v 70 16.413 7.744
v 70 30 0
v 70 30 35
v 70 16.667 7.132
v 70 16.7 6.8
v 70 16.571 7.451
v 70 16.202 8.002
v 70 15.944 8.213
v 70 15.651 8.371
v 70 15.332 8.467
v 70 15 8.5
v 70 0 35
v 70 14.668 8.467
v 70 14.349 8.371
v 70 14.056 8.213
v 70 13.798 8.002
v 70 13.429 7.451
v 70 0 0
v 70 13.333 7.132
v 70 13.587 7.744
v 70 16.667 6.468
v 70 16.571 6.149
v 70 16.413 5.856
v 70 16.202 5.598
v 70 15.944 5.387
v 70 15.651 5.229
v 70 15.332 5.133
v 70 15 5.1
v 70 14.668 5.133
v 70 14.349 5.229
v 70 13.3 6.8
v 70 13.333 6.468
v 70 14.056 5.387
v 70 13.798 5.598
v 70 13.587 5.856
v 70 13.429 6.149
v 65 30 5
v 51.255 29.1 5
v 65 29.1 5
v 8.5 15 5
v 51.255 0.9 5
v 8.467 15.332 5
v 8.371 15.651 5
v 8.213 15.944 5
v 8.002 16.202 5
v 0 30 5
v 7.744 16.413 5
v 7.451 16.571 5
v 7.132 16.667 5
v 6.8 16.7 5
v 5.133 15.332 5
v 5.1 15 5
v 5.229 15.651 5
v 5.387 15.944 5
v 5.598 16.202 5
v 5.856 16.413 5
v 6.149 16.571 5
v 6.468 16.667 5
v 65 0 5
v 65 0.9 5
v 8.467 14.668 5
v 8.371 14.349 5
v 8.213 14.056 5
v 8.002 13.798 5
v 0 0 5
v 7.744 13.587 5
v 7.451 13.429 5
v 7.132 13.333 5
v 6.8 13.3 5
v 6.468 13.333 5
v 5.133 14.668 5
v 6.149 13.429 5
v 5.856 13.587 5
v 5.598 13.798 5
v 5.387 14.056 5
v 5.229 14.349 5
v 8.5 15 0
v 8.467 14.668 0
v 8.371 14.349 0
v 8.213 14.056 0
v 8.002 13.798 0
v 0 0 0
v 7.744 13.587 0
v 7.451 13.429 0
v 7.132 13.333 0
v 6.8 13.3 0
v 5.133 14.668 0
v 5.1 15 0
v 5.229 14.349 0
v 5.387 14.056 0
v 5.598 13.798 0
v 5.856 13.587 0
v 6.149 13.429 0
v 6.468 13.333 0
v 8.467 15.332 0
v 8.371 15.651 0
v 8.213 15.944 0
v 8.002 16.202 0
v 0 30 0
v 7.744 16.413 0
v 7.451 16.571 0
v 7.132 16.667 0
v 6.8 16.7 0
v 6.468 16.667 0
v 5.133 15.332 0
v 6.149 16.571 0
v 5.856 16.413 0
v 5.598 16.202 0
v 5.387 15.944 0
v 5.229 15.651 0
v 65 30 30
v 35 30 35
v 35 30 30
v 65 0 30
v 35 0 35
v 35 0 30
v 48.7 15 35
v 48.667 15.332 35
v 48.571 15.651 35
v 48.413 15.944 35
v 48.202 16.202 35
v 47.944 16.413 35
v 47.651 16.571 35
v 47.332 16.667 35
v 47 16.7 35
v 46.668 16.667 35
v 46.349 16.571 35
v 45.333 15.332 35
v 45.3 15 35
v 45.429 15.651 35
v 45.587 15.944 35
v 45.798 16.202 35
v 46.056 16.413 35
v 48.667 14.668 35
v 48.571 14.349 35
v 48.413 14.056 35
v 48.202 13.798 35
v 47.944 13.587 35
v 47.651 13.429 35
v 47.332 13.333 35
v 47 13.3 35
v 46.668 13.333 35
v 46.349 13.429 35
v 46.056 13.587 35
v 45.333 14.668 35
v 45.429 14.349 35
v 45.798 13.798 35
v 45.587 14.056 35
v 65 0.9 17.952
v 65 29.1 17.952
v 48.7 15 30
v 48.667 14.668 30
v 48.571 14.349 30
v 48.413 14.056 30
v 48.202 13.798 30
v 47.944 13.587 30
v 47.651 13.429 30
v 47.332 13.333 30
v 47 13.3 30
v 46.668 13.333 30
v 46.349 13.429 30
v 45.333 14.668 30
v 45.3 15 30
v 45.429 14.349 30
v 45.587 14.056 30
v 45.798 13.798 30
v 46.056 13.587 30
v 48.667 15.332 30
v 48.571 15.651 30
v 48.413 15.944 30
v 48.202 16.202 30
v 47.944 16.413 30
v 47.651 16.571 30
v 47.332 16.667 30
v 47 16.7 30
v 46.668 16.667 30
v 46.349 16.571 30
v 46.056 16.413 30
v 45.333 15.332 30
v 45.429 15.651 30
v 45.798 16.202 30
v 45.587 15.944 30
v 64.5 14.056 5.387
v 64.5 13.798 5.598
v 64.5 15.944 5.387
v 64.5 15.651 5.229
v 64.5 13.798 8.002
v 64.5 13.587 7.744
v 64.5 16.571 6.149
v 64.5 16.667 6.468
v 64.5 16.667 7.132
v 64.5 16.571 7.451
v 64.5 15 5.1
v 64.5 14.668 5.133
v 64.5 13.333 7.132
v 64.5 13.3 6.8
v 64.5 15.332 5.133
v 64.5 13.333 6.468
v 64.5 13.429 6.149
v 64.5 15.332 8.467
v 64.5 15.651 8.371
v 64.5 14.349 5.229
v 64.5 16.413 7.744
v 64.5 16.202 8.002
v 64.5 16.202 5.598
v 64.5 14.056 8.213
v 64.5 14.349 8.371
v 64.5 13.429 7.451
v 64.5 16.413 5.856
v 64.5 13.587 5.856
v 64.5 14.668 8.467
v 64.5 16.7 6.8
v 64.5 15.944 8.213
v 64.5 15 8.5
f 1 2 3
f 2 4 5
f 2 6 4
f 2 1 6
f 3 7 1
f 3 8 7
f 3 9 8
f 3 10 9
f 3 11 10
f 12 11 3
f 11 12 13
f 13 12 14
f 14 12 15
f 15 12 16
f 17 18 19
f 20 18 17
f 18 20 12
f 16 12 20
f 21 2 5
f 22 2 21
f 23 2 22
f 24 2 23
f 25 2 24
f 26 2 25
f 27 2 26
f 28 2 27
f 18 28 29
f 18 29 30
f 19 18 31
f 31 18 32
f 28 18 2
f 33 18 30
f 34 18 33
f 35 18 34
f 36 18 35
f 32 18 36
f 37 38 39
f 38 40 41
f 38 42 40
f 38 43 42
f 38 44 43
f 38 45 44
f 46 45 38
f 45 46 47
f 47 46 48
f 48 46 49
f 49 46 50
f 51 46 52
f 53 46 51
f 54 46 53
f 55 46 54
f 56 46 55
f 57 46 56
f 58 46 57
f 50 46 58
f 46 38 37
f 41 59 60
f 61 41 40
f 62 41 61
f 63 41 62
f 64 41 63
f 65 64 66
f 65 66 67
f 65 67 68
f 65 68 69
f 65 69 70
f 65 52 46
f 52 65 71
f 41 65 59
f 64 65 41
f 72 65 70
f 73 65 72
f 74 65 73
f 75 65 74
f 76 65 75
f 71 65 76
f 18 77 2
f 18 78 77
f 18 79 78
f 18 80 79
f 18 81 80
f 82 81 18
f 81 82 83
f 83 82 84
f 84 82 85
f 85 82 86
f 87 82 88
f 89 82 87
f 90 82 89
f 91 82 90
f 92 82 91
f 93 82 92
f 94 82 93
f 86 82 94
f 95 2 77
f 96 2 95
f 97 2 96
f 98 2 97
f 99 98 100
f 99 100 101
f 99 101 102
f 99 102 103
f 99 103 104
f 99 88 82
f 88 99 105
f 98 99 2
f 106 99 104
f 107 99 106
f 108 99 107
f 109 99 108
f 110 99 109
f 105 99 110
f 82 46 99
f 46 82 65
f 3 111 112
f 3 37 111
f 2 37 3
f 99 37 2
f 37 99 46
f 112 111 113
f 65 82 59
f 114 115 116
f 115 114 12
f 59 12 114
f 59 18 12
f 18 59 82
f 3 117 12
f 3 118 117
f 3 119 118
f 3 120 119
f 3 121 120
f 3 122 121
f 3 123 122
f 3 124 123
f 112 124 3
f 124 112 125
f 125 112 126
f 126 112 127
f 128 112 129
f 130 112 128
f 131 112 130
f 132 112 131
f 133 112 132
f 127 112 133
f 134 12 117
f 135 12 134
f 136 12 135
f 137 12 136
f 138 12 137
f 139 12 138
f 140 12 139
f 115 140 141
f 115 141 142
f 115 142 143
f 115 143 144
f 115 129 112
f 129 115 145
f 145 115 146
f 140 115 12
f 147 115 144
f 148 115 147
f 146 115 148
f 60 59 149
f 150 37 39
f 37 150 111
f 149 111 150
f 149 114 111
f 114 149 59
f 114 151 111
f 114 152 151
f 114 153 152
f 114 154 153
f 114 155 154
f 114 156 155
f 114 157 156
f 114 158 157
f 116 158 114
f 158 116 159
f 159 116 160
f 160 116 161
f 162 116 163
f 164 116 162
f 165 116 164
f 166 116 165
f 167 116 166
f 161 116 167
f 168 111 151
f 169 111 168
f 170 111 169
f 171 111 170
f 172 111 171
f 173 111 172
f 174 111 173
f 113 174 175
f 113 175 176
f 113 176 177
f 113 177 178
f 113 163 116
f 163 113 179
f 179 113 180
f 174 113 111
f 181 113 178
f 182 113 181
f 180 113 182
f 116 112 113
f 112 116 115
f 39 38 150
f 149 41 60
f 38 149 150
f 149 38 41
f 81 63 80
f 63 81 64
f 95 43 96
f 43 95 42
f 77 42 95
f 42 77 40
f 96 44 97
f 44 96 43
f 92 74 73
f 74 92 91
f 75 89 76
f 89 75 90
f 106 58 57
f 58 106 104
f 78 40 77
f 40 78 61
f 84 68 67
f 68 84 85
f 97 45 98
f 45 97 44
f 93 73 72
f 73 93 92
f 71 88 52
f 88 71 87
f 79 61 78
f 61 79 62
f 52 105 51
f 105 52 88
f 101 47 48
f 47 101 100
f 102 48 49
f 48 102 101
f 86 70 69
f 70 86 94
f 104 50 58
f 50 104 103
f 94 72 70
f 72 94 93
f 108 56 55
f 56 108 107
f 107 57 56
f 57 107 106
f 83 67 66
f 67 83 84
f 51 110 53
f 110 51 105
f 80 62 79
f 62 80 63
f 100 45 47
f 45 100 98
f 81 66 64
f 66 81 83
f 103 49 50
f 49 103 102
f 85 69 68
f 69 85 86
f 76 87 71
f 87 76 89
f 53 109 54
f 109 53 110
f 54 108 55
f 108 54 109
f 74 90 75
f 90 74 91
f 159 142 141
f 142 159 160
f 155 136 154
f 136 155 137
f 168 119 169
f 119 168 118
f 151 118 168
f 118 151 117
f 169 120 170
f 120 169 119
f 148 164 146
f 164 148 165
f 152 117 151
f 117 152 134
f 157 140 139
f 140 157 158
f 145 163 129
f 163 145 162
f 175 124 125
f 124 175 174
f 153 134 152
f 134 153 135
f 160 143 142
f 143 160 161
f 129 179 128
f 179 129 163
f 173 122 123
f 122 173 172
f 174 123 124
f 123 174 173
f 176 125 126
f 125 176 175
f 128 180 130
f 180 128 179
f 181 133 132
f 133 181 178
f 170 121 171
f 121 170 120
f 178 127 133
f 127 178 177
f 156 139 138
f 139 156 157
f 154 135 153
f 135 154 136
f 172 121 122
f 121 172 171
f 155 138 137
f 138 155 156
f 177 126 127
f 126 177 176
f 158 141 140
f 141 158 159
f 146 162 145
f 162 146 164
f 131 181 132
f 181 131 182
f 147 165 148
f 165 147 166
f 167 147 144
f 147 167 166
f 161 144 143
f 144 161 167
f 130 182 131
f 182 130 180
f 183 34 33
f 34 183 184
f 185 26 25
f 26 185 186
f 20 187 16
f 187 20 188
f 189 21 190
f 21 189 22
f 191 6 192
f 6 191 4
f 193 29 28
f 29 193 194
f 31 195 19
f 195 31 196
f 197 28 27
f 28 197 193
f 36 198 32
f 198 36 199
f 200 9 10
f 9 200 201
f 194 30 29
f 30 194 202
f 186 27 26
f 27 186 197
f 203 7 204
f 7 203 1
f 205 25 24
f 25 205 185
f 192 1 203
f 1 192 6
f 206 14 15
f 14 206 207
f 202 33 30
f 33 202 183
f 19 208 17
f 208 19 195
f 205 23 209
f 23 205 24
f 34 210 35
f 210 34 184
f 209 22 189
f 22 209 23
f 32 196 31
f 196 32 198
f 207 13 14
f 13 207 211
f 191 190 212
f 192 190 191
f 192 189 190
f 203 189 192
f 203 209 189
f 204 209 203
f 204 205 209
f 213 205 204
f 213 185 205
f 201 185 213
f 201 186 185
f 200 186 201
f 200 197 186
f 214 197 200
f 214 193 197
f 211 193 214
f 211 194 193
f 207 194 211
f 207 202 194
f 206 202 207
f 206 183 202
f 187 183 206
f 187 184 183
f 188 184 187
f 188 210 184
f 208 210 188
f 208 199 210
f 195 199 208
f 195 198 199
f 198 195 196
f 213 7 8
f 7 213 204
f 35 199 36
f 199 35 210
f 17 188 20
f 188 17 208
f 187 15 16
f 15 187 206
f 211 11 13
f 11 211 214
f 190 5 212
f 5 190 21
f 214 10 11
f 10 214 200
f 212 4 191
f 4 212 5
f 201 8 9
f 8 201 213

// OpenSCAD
$fn = 32;

// ----------------------------------------------------------------------
// Z-bracket: 70 x 30 x 35 mm
// ----------------------------------------------------------------------

// --- parameters (mm) ---
bottom_run = 70;          // lower foot length, X
top_run = 30;             // upper foot length, X
profile_w = 30;           // bracket width, Y
height = 35;              // overall rise, Z
mat_t = 5;                // plate thickness
hole_d = 3.4;             // clearance for M3
rib_len = 14.7;           // gusset leg
rib_sink = 0.9;           // gusset overlap into the plates

module hole_z(px, py, z0) {
  translate([px, py, z0 - 0.5]) cylinder(h = mat_t + 1, d = hole_d);
}
module hole_x(py, pz) {
  translate([-0.5, py, pz]) rotate([0, 90, 0]) cylinder(h = mat_t + 1, d = hole_d);
}
module gusset(x0) {
  translate([x0, profile_w - rib_sink, 0])
    rotate([90, 0, 0])
      linear_extrude(height = profile_w - 2 * rib_sink)
        polygon(points = [[rib_sink, mat_t - rib_sink],
                          [rib_sink, mat_t - rib_sink + rib_len],
                          [-rib_len, mat_t - rib_sink]]);
}

difference() {
  union() {
    cube([bottom_run, profile_w, mat_t]);
    /* web, overlapping the lower foot */
    translate([bottom_run - mat_t, 0, 0]) cube([mat_t, profile_w, height]);
    /* upper foot, sunk into the web */
    translate([bottom_run - mat_t - top_run, 0, height - mat_t]) cube([top_run + mat_t, profile_w, mat_t]);
    gusset(bottom_run - mat_t);
  }
  hole_z(6.8, 15, 0);
  translate([bottom_run - mat_t - 18, 0, 0]) hole_z(0, 15, height - mat_t);
  translate([bottom_run - mat_t, 0, 0]) hole_x(15, 6.8);
}
